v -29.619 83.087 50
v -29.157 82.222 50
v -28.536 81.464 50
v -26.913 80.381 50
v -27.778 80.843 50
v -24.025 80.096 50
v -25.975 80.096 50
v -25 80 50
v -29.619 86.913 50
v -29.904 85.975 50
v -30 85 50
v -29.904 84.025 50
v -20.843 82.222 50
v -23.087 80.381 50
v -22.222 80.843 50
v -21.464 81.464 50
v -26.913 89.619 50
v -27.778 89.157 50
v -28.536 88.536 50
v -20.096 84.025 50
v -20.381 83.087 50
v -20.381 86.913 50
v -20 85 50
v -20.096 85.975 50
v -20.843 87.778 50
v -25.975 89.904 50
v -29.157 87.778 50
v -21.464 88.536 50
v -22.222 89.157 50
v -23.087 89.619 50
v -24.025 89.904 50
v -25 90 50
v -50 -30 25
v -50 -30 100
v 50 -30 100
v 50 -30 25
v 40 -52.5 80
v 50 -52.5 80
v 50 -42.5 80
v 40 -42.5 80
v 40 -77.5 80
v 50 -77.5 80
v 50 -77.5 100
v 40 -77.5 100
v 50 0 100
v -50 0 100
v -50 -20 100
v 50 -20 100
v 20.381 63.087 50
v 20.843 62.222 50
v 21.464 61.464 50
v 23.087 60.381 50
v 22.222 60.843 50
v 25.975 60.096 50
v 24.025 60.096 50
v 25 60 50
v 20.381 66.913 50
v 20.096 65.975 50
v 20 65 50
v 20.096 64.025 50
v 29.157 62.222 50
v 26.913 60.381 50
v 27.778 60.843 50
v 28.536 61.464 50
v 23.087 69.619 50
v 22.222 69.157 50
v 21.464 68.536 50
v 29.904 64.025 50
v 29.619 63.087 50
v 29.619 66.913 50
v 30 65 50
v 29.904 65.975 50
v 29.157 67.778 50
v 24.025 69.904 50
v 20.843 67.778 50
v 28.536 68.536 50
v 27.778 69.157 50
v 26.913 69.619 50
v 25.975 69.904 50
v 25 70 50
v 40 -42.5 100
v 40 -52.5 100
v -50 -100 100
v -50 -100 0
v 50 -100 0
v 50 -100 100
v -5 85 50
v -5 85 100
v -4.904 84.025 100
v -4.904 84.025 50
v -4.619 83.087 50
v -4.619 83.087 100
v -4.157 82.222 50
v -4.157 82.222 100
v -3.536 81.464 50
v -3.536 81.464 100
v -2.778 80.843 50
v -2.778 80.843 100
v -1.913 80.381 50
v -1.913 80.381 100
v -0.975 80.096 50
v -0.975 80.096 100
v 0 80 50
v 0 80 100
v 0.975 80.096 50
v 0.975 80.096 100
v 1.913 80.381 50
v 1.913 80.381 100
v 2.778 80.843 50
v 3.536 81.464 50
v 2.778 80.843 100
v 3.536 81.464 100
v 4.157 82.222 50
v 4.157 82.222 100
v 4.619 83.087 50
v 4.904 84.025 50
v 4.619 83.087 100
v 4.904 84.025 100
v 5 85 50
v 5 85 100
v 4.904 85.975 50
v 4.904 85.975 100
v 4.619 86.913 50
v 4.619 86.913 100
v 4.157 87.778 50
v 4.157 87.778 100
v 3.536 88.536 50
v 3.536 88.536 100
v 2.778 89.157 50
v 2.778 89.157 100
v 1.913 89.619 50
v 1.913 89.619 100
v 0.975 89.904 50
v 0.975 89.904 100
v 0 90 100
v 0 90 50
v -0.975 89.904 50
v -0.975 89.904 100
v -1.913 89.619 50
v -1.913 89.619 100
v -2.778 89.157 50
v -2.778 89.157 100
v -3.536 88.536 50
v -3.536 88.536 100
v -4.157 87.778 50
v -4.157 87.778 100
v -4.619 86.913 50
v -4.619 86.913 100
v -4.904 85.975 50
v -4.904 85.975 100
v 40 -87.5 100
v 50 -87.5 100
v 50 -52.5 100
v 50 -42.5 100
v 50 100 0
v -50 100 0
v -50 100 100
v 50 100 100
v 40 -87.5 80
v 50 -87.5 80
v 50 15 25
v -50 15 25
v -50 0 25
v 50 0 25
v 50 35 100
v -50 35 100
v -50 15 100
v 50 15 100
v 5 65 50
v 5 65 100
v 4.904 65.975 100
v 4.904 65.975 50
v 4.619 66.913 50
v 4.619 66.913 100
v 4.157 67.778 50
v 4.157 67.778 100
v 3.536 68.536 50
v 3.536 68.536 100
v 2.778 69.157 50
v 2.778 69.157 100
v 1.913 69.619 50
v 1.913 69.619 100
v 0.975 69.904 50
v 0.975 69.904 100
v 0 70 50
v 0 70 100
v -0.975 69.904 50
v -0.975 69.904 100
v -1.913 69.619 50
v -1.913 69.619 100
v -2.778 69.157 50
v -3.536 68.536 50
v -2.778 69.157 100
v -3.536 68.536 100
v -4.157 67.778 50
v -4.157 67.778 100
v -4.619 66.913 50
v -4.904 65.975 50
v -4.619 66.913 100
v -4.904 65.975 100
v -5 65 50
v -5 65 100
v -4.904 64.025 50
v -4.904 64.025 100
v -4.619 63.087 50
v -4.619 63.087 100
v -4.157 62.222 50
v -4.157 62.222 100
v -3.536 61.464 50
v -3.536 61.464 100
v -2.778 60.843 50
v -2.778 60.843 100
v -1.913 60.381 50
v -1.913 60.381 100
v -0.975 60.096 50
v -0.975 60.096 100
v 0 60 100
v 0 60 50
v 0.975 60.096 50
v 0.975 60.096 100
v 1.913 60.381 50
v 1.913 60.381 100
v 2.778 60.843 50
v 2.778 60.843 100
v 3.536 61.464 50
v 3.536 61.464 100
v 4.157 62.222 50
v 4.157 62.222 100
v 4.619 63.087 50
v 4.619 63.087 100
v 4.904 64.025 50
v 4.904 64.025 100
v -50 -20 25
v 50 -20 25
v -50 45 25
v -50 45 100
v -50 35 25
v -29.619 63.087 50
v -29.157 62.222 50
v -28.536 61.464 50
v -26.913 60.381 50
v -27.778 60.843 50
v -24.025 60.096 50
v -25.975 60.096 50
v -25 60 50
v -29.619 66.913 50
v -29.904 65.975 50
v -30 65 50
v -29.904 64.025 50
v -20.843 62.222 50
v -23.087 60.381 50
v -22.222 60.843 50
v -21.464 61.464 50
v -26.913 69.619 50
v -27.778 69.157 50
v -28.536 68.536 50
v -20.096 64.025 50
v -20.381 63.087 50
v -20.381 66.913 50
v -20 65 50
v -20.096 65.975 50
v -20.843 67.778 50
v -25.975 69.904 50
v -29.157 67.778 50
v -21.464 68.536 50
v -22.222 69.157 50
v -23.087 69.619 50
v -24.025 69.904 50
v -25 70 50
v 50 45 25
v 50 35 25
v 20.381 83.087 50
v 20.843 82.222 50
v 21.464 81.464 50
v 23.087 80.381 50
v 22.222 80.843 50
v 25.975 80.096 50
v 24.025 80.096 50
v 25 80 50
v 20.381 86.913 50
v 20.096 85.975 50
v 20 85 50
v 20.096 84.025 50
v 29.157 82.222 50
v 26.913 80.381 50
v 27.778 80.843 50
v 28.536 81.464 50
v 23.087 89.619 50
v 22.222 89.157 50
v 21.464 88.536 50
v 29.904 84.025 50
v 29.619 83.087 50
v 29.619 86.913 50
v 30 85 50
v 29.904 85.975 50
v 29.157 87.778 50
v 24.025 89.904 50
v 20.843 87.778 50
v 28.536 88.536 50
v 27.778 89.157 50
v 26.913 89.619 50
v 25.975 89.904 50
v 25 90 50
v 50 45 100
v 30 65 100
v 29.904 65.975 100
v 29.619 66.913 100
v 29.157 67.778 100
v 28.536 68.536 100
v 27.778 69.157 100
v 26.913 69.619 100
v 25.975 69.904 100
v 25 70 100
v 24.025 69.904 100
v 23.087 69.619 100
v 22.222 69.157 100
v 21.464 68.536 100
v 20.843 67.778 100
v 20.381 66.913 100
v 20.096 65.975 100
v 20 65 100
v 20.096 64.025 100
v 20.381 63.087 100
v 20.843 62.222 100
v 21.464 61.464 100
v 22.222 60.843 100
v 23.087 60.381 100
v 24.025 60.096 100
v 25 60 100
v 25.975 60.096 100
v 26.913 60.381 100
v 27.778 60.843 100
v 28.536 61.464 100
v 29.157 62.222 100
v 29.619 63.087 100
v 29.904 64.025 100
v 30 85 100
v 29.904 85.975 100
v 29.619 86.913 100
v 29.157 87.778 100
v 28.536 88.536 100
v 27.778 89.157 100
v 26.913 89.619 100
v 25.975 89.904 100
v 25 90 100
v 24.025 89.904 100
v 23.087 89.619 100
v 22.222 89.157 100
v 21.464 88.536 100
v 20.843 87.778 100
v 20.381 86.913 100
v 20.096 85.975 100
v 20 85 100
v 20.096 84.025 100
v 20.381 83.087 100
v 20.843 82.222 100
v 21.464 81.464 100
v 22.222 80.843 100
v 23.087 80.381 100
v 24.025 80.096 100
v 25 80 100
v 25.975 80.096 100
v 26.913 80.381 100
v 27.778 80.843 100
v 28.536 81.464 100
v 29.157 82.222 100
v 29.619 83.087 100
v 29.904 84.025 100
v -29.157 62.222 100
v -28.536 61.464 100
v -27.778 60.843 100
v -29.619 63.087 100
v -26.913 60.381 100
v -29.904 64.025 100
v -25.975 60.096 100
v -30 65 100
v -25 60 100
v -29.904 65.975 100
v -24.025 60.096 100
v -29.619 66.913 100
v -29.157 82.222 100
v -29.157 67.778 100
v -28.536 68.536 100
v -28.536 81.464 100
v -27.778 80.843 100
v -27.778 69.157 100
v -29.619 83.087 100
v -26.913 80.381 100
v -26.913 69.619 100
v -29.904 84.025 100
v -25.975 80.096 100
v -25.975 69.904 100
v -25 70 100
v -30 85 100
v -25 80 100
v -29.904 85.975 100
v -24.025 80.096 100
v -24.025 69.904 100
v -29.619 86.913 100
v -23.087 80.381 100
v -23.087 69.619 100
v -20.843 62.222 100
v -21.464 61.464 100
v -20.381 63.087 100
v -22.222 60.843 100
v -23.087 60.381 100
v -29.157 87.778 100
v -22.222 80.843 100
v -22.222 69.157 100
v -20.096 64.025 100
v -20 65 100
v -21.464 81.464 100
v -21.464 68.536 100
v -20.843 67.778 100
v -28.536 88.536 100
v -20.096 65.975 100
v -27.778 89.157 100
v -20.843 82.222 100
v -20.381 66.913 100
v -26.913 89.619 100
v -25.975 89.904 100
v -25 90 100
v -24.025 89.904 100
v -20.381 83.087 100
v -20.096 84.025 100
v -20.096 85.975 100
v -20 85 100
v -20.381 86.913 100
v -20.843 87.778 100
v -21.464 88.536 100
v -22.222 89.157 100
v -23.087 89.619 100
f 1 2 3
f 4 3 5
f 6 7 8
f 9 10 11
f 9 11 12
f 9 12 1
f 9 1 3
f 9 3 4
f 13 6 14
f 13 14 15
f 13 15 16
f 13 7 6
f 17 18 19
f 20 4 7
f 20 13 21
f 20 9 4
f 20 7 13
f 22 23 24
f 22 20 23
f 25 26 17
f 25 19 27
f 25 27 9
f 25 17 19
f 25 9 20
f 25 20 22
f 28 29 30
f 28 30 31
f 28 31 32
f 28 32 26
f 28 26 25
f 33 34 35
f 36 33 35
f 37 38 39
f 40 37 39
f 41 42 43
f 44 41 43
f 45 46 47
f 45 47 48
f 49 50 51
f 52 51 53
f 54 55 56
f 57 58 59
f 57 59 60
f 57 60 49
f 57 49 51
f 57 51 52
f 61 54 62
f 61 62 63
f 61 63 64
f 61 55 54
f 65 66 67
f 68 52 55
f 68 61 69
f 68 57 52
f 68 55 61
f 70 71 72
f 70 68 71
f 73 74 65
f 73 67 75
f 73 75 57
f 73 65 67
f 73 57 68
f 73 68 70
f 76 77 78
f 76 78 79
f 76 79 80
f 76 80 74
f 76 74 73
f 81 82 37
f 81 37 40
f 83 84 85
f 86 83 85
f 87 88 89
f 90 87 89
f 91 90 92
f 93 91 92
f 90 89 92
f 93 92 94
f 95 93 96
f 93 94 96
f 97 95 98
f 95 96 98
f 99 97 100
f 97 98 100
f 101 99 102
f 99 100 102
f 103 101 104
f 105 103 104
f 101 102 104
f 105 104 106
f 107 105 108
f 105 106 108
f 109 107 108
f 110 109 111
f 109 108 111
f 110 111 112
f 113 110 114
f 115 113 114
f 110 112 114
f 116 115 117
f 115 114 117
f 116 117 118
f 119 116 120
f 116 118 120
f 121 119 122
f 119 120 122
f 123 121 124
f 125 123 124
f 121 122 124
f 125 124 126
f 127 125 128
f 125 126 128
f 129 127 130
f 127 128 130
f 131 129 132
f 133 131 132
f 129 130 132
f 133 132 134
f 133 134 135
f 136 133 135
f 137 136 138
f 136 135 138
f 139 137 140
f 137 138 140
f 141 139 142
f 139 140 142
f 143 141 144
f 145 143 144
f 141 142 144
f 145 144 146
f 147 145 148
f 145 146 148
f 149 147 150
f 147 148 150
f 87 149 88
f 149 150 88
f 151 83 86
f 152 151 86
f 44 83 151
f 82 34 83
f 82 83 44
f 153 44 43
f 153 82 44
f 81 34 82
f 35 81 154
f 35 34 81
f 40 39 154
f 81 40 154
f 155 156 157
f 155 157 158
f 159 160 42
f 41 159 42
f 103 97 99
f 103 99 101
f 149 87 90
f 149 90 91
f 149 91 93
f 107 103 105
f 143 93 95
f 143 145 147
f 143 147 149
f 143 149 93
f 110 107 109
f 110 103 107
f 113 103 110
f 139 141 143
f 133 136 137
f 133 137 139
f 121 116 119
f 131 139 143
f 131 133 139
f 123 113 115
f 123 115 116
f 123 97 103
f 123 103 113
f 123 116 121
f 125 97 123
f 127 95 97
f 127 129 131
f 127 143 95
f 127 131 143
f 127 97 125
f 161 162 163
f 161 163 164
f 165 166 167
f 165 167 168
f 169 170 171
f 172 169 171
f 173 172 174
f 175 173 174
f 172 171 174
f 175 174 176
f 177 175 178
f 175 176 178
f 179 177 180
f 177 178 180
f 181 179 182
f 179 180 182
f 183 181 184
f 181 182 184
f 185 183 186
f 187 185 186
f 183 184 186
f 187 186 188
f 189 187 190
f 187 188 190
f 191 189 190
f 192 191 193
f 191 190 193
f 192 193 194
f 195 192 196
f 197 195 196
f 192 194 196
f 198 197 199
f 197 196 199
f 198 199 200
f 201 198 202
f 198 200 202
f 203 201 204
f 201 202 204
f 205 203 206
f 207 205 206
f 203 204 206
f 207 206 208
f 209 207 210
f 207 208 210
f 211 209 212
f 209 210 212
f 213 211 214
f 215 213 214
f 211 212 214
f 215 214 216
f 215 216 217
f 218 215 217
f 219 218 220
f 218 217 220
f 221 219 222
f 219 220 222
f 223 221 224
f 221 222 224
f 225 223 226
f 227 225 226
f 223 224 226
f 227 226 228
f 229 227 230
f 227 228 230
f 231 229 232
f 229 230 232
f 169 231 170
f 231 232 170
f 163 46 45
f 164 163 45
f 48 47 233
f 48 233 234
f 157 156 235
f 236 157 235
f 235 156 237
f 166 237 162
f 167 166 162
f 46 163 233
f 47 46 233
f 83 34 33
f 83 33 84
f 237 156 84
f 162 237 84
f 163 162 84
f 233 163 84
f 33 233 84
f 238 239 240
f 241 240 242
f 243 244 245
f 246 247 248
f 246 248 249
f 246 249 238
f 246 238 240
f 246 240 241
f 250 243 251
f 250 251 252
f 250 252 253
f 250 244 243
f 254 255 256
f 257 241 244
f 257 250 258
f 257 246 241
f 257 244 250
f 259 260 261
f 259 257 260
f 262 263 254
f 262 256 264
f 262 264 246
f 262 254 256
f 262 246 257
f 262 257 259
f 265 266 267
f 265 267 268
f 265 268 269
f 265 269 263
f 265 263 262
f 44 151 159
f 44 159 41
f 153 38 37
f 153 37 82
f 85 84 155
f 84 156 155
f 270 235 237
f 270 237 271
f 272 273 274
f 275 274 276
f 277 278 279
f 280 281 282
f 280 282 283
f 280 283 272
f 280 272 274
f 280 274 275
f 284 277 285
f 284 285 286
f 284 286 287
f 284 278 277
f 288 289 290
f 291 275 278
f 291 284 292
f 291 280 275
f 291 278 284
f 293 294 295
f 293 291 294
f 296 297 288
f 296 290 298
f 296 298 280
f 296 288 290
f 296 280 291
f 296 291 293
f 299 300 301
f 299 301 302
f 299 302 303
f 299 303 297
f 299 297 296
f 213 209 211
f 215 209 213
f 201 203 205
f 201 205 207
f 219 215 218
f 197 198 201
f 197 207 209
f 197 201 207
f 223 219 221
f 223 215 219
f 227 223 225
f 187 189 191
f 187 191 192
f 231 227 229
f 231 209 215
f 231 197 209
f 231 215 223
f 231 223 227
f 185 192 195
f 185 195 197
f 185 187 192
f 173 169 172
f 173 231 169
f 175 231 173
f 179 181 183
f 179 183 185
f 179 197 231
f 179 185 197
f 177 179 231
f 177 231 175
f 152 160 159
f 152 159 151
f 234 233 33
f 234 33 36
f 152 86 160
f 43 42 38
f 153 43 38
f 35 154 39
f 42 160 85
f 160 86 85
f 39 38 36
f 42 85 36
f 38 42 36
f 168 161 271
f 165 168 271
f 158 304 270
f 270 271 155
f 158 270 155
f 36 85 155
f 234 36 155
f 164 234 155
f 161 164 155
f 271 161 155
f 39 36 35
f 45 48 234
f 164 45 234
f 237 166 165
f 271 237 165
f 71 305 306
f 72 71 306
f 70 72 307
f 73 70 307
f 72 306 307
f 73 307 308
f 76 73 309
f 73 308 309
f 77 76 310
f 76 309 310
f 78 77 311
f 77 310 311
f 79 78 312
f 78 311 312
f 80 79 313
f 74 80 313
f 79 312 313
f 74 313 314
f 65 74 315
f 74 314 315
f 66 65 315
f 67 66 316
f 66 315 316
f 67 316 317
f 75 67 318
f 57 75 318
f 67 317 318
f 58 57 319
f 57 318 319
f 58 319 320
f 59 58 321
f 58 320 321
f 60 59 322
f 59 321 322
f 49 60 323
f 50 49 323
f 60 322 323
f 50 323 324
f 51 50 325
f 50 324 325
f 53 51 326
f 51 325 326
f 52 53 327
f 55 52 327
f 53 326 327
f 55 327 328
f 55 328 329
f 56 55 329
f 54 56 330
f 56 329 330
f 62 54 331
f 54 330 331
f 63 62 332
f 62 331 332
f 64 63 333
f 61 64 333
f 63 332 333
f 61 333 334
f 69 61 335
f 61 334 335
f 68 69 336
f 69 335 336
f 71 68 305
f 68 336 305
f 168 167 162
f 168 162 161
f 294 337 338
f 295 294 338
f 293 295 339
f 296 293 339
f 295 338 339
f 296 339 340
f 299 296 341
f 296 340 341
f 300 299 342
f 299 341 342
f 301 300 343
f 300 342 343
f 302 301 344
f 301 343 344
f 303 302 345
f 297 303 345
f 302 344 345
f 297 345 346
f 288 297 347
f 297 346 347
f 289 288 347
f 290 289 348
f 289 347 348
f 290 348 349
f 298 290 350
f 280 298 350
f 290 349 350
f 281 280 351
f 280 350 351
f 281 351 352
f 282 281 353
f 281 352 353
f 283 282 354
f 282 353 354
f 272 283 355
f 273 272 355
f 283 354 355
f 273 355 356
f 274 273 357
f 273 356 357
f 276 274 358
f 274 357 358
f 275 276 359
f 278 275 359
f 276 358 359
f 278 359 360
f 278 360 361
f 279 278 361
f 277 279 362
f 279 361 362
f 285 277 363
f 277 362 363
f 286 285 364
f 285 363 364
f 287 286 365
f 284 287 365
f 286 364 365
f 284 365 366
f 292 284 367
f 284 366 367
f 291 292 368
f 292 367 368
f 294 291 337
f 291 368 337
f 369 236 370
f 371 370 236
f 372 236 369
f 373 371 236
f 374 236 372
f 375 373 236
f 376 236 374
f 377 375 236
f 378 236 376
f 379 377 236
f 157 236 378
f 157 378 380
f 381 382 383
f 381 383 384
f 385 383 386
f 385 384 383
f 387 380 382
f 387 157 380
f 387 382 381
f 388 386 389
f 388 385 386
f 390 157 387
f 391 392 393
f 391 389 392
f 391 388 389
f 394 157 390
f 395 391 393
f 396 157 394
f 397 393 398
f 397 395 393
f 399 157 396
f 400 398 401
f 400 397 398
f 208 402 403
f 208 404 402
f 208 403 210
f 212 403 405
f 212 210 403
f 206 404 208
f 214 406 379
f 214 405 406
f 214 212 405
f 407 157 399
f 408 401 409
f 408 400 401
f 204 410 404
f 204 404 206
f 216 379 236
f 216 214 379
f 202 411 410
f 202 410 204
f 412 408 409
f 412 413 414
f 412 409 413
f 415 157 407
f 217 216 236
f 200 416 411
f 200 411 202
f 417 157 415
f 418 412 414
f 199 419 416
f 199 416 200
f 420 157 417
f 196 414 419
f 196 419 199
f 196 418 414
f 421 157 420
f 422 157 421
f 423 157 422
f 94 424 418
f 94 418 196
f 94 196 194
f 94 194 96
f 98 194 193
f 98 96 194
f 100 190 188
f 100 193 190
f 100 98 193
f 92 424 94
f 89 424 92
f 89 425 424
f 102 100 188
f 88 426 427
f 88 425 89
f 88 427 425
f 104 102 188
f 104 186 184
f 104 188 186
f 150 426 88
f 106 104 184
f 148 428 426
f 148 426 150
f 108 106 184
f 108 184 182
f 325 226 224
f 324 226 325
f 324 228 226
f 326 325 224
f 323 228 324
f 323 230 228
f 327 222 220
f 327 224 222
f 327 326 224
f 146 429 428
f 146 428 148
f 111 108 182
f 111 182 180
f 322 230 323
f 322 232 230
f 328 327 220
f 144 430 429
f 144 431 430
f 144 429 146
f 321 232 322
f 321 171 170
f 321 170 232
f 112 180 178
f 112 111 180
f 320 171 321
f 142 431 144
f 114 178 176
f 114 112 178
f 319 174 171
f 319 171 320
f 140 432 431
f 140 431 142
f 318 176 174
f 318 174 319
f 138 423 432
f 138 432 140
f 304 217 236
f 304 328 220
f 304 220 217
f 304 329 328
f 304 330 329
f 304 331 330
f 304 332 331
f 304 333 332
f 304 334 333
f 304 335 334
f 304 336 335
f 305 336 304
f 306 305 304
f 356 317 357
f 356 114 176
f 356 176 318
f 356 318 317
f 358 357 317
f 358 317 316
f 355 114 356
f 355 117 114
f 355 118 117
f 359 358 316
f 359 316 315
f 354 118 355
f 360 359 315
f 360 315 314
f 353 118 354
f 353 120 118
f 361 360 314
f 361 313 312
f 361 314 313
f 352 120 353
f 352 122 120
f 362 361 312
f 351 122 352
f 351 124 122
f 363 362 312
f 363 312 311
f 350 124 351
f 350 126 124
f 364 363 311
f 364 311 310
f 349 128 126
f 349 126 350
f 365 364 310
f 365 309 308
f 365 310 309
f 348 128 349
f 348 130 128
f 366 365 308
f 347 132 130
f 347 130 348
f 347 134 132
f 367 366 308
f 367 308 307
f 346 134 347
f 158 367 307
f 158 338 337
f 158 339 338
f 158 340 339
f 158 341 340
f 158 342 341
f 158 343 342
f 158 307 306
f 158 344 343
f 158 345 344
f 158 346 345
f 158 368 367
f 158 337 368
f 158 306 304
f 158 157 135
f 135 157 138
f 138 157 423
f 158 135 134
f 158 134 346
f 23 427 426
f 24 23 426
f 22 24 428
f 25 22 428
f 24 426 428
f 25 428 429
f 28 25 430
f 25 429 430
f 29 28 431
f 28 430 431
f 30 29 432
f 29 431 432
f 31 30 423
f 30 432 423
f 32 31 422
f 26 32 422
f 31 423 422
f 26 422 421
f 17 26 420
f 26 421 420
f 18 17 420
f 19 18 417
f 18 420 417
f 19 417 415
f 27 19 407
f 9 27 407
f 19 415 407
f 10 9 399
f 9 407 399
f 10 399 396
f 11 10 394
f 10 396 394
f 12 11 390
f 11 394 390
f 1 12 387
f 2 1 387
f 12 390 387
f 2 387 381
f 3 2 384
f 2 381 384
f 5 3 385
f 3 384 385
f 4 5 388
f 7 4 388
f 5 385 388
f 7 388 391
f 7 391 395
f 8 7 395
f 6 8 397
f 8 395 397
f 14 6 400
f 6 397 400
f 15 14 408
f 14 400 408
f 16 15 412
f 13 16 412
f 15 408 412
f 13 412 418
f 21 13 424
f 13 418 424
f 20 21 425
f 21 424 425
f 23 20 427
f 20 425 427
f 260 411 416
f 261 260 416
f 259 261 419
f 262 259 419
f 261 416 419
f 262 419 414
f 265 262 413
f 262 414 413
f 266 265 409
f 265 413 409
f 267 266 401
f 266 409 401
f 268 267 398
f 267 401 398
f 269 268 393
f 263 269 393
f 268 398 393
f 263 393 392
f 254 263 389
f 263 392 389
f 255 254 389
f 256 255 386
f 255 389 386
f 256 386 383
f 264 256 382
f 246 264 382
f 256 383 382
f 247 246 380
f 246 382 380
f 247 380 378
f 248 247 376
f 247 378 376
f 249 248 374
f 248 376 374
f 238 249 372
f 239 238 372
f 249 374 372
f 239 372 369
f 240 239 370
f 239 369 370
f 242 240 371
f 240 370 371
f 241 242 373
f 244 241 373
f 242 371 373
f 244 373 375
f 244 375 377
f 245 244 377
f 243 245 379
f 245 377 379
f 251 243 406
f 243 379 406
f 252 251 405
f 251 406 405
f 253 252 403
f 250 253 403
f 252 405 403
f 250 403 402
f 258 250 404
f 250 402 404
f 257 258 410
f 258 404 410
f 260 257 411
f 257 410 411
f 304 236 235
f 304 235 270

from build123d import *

# Parameters (mm, degrees)
F0_W     = 100
F0_H     = 135
F1_DEPTH = 100
F0_W_2   = 11.520768702
F0_H_2   = 10
F2_DEPTH = 100
F3_W     = 100
F3_H     = 10
F3_H_2   = 15
F5_DEPTH = 75
F6_DEPTH = 50
F4_W     = 10
F4_H     = 20
F7_DEPTH = 10


with BuildPart() as f1:
    # F0 (on Top) → F1 (new body)
    with BuildSketch(Plane.XY):
        with Locations((0, 32.5)):
            Rectangle(F0_W, F0_H)
    extrude(amount=F1_DEPTH)

    # F0 (on Top) → F2 (join)
    with BuildSketch(Plane.XY):
        Polygon((50, -45), (50, -35), (-50, -35), (-50, -100), (50, -100), (50, -90), (38.479231298, -90), (38.479231298, -80), (50, -80), (50, -55), (38.479231298, -55), (38.479231298, -45), align=None)
        with Locations((44.239615649, -50)):
            Rectangle(F0_W_2, F0_H_2)
        with Locations((44.239615649, -85)):
            Rectangle(F0_W_2, F0_H_2)
    extrude(amount=F2_DEPTH)

    # F3 (on face) → F5 (cut)
    with BuildSketch(Plane.XY.offset(100)):
        with Locations((0, -25)):
            Rectangle(F3_W, F3_H)
        with Locations((0, 7.5)):
            Rectangle(F3_W, F3_H_2)
        with Locations((0, 40)):
            Rectangle(F3_W, F3_H)
    extrude(amount=-F5_DEPTH, mode=Mode.SUBTRACT)

    # F3 (on face) → F6 (cut)
    with BuildSketch(Plane.XY.offset(100)):
        with BuildLine():
            ThreePointArc((20, 65), (25, 60), (30, 65))
            Line((30, 65), (20, 65))
        make_face()
        with BuildLine():
            Line((20, 65), (30, 65))
            ThreePointArc((30, 65), (25, 70), (20, 65))
        make_face()
        with BuildLine():
            ThreePointArc((-5, 65), (0, 60), (5, 65))
            Line((5, 65), (-5, 65))
        make_face()
        with BuildLine():
            Line((-5, 65), (5, 65))
            ThreePointArc((5, 65), (0, 70), (-5, 65))
        make_face()
        with BuildLine():
            Line((-20, 65), (-30, 65))
            ThreePointArc((-30, 65), (-25, 60), (-20, 65))
        make_face()
        with BuildLine():
            ThreePointArc((-20, 65), (-25, 70), (-30, 65))
            Line((-30, 65), (-20, 65))
        make_face()
        with BuildLine():
            ThreePointArc((-30, 85), (-25, 80), (-20, 85))
            Line((-20, 85), (-30, 85))
        make_face()
        with BuildLine():
            Line((-30, 85), (-20, 85))
            ThreePointArc((-20, 85), (-25, 90), (-30, 85))
        make_face()
        with BuildLine():
            Line((-5, 85), (5, 85))
            ThreePointArc((5, 85), (0, 90), (-5, 85))
        make_face()
        with BuildLine():
            ThreePointArc((-5, 85), (0, 80), (5, 85))
            Line((5, 85), (-5, 85))
        make_face()
        with BuildLine():
            ThreePointArc((20, 85), (25, 80), (30, 85))
            Line((30, 85), (20, 85))
        make_face()
        with BuildLine():
            Line((20, 85), (30, 85))
            ThreePointArc((30, 85), (25, 90), (20, 85))
        make_face()
    extrude(amount=-F6_DEPTH, mode=Mode.SUBTRACT)

    # F4 (on face) → F7 (cut)
    with BuildSketch(Plane.YZ.offset(50)):
        with Locations((-82.5, 90)):
            Rectangle(F4_W, F4_H)
        with Locations((-47.5, 90)):
            Rectangle(F4_W, F4_H)
    extrude(amount=-F7_DEPTH, mode=Mode.SUBTRACT)


solid = f1.part
